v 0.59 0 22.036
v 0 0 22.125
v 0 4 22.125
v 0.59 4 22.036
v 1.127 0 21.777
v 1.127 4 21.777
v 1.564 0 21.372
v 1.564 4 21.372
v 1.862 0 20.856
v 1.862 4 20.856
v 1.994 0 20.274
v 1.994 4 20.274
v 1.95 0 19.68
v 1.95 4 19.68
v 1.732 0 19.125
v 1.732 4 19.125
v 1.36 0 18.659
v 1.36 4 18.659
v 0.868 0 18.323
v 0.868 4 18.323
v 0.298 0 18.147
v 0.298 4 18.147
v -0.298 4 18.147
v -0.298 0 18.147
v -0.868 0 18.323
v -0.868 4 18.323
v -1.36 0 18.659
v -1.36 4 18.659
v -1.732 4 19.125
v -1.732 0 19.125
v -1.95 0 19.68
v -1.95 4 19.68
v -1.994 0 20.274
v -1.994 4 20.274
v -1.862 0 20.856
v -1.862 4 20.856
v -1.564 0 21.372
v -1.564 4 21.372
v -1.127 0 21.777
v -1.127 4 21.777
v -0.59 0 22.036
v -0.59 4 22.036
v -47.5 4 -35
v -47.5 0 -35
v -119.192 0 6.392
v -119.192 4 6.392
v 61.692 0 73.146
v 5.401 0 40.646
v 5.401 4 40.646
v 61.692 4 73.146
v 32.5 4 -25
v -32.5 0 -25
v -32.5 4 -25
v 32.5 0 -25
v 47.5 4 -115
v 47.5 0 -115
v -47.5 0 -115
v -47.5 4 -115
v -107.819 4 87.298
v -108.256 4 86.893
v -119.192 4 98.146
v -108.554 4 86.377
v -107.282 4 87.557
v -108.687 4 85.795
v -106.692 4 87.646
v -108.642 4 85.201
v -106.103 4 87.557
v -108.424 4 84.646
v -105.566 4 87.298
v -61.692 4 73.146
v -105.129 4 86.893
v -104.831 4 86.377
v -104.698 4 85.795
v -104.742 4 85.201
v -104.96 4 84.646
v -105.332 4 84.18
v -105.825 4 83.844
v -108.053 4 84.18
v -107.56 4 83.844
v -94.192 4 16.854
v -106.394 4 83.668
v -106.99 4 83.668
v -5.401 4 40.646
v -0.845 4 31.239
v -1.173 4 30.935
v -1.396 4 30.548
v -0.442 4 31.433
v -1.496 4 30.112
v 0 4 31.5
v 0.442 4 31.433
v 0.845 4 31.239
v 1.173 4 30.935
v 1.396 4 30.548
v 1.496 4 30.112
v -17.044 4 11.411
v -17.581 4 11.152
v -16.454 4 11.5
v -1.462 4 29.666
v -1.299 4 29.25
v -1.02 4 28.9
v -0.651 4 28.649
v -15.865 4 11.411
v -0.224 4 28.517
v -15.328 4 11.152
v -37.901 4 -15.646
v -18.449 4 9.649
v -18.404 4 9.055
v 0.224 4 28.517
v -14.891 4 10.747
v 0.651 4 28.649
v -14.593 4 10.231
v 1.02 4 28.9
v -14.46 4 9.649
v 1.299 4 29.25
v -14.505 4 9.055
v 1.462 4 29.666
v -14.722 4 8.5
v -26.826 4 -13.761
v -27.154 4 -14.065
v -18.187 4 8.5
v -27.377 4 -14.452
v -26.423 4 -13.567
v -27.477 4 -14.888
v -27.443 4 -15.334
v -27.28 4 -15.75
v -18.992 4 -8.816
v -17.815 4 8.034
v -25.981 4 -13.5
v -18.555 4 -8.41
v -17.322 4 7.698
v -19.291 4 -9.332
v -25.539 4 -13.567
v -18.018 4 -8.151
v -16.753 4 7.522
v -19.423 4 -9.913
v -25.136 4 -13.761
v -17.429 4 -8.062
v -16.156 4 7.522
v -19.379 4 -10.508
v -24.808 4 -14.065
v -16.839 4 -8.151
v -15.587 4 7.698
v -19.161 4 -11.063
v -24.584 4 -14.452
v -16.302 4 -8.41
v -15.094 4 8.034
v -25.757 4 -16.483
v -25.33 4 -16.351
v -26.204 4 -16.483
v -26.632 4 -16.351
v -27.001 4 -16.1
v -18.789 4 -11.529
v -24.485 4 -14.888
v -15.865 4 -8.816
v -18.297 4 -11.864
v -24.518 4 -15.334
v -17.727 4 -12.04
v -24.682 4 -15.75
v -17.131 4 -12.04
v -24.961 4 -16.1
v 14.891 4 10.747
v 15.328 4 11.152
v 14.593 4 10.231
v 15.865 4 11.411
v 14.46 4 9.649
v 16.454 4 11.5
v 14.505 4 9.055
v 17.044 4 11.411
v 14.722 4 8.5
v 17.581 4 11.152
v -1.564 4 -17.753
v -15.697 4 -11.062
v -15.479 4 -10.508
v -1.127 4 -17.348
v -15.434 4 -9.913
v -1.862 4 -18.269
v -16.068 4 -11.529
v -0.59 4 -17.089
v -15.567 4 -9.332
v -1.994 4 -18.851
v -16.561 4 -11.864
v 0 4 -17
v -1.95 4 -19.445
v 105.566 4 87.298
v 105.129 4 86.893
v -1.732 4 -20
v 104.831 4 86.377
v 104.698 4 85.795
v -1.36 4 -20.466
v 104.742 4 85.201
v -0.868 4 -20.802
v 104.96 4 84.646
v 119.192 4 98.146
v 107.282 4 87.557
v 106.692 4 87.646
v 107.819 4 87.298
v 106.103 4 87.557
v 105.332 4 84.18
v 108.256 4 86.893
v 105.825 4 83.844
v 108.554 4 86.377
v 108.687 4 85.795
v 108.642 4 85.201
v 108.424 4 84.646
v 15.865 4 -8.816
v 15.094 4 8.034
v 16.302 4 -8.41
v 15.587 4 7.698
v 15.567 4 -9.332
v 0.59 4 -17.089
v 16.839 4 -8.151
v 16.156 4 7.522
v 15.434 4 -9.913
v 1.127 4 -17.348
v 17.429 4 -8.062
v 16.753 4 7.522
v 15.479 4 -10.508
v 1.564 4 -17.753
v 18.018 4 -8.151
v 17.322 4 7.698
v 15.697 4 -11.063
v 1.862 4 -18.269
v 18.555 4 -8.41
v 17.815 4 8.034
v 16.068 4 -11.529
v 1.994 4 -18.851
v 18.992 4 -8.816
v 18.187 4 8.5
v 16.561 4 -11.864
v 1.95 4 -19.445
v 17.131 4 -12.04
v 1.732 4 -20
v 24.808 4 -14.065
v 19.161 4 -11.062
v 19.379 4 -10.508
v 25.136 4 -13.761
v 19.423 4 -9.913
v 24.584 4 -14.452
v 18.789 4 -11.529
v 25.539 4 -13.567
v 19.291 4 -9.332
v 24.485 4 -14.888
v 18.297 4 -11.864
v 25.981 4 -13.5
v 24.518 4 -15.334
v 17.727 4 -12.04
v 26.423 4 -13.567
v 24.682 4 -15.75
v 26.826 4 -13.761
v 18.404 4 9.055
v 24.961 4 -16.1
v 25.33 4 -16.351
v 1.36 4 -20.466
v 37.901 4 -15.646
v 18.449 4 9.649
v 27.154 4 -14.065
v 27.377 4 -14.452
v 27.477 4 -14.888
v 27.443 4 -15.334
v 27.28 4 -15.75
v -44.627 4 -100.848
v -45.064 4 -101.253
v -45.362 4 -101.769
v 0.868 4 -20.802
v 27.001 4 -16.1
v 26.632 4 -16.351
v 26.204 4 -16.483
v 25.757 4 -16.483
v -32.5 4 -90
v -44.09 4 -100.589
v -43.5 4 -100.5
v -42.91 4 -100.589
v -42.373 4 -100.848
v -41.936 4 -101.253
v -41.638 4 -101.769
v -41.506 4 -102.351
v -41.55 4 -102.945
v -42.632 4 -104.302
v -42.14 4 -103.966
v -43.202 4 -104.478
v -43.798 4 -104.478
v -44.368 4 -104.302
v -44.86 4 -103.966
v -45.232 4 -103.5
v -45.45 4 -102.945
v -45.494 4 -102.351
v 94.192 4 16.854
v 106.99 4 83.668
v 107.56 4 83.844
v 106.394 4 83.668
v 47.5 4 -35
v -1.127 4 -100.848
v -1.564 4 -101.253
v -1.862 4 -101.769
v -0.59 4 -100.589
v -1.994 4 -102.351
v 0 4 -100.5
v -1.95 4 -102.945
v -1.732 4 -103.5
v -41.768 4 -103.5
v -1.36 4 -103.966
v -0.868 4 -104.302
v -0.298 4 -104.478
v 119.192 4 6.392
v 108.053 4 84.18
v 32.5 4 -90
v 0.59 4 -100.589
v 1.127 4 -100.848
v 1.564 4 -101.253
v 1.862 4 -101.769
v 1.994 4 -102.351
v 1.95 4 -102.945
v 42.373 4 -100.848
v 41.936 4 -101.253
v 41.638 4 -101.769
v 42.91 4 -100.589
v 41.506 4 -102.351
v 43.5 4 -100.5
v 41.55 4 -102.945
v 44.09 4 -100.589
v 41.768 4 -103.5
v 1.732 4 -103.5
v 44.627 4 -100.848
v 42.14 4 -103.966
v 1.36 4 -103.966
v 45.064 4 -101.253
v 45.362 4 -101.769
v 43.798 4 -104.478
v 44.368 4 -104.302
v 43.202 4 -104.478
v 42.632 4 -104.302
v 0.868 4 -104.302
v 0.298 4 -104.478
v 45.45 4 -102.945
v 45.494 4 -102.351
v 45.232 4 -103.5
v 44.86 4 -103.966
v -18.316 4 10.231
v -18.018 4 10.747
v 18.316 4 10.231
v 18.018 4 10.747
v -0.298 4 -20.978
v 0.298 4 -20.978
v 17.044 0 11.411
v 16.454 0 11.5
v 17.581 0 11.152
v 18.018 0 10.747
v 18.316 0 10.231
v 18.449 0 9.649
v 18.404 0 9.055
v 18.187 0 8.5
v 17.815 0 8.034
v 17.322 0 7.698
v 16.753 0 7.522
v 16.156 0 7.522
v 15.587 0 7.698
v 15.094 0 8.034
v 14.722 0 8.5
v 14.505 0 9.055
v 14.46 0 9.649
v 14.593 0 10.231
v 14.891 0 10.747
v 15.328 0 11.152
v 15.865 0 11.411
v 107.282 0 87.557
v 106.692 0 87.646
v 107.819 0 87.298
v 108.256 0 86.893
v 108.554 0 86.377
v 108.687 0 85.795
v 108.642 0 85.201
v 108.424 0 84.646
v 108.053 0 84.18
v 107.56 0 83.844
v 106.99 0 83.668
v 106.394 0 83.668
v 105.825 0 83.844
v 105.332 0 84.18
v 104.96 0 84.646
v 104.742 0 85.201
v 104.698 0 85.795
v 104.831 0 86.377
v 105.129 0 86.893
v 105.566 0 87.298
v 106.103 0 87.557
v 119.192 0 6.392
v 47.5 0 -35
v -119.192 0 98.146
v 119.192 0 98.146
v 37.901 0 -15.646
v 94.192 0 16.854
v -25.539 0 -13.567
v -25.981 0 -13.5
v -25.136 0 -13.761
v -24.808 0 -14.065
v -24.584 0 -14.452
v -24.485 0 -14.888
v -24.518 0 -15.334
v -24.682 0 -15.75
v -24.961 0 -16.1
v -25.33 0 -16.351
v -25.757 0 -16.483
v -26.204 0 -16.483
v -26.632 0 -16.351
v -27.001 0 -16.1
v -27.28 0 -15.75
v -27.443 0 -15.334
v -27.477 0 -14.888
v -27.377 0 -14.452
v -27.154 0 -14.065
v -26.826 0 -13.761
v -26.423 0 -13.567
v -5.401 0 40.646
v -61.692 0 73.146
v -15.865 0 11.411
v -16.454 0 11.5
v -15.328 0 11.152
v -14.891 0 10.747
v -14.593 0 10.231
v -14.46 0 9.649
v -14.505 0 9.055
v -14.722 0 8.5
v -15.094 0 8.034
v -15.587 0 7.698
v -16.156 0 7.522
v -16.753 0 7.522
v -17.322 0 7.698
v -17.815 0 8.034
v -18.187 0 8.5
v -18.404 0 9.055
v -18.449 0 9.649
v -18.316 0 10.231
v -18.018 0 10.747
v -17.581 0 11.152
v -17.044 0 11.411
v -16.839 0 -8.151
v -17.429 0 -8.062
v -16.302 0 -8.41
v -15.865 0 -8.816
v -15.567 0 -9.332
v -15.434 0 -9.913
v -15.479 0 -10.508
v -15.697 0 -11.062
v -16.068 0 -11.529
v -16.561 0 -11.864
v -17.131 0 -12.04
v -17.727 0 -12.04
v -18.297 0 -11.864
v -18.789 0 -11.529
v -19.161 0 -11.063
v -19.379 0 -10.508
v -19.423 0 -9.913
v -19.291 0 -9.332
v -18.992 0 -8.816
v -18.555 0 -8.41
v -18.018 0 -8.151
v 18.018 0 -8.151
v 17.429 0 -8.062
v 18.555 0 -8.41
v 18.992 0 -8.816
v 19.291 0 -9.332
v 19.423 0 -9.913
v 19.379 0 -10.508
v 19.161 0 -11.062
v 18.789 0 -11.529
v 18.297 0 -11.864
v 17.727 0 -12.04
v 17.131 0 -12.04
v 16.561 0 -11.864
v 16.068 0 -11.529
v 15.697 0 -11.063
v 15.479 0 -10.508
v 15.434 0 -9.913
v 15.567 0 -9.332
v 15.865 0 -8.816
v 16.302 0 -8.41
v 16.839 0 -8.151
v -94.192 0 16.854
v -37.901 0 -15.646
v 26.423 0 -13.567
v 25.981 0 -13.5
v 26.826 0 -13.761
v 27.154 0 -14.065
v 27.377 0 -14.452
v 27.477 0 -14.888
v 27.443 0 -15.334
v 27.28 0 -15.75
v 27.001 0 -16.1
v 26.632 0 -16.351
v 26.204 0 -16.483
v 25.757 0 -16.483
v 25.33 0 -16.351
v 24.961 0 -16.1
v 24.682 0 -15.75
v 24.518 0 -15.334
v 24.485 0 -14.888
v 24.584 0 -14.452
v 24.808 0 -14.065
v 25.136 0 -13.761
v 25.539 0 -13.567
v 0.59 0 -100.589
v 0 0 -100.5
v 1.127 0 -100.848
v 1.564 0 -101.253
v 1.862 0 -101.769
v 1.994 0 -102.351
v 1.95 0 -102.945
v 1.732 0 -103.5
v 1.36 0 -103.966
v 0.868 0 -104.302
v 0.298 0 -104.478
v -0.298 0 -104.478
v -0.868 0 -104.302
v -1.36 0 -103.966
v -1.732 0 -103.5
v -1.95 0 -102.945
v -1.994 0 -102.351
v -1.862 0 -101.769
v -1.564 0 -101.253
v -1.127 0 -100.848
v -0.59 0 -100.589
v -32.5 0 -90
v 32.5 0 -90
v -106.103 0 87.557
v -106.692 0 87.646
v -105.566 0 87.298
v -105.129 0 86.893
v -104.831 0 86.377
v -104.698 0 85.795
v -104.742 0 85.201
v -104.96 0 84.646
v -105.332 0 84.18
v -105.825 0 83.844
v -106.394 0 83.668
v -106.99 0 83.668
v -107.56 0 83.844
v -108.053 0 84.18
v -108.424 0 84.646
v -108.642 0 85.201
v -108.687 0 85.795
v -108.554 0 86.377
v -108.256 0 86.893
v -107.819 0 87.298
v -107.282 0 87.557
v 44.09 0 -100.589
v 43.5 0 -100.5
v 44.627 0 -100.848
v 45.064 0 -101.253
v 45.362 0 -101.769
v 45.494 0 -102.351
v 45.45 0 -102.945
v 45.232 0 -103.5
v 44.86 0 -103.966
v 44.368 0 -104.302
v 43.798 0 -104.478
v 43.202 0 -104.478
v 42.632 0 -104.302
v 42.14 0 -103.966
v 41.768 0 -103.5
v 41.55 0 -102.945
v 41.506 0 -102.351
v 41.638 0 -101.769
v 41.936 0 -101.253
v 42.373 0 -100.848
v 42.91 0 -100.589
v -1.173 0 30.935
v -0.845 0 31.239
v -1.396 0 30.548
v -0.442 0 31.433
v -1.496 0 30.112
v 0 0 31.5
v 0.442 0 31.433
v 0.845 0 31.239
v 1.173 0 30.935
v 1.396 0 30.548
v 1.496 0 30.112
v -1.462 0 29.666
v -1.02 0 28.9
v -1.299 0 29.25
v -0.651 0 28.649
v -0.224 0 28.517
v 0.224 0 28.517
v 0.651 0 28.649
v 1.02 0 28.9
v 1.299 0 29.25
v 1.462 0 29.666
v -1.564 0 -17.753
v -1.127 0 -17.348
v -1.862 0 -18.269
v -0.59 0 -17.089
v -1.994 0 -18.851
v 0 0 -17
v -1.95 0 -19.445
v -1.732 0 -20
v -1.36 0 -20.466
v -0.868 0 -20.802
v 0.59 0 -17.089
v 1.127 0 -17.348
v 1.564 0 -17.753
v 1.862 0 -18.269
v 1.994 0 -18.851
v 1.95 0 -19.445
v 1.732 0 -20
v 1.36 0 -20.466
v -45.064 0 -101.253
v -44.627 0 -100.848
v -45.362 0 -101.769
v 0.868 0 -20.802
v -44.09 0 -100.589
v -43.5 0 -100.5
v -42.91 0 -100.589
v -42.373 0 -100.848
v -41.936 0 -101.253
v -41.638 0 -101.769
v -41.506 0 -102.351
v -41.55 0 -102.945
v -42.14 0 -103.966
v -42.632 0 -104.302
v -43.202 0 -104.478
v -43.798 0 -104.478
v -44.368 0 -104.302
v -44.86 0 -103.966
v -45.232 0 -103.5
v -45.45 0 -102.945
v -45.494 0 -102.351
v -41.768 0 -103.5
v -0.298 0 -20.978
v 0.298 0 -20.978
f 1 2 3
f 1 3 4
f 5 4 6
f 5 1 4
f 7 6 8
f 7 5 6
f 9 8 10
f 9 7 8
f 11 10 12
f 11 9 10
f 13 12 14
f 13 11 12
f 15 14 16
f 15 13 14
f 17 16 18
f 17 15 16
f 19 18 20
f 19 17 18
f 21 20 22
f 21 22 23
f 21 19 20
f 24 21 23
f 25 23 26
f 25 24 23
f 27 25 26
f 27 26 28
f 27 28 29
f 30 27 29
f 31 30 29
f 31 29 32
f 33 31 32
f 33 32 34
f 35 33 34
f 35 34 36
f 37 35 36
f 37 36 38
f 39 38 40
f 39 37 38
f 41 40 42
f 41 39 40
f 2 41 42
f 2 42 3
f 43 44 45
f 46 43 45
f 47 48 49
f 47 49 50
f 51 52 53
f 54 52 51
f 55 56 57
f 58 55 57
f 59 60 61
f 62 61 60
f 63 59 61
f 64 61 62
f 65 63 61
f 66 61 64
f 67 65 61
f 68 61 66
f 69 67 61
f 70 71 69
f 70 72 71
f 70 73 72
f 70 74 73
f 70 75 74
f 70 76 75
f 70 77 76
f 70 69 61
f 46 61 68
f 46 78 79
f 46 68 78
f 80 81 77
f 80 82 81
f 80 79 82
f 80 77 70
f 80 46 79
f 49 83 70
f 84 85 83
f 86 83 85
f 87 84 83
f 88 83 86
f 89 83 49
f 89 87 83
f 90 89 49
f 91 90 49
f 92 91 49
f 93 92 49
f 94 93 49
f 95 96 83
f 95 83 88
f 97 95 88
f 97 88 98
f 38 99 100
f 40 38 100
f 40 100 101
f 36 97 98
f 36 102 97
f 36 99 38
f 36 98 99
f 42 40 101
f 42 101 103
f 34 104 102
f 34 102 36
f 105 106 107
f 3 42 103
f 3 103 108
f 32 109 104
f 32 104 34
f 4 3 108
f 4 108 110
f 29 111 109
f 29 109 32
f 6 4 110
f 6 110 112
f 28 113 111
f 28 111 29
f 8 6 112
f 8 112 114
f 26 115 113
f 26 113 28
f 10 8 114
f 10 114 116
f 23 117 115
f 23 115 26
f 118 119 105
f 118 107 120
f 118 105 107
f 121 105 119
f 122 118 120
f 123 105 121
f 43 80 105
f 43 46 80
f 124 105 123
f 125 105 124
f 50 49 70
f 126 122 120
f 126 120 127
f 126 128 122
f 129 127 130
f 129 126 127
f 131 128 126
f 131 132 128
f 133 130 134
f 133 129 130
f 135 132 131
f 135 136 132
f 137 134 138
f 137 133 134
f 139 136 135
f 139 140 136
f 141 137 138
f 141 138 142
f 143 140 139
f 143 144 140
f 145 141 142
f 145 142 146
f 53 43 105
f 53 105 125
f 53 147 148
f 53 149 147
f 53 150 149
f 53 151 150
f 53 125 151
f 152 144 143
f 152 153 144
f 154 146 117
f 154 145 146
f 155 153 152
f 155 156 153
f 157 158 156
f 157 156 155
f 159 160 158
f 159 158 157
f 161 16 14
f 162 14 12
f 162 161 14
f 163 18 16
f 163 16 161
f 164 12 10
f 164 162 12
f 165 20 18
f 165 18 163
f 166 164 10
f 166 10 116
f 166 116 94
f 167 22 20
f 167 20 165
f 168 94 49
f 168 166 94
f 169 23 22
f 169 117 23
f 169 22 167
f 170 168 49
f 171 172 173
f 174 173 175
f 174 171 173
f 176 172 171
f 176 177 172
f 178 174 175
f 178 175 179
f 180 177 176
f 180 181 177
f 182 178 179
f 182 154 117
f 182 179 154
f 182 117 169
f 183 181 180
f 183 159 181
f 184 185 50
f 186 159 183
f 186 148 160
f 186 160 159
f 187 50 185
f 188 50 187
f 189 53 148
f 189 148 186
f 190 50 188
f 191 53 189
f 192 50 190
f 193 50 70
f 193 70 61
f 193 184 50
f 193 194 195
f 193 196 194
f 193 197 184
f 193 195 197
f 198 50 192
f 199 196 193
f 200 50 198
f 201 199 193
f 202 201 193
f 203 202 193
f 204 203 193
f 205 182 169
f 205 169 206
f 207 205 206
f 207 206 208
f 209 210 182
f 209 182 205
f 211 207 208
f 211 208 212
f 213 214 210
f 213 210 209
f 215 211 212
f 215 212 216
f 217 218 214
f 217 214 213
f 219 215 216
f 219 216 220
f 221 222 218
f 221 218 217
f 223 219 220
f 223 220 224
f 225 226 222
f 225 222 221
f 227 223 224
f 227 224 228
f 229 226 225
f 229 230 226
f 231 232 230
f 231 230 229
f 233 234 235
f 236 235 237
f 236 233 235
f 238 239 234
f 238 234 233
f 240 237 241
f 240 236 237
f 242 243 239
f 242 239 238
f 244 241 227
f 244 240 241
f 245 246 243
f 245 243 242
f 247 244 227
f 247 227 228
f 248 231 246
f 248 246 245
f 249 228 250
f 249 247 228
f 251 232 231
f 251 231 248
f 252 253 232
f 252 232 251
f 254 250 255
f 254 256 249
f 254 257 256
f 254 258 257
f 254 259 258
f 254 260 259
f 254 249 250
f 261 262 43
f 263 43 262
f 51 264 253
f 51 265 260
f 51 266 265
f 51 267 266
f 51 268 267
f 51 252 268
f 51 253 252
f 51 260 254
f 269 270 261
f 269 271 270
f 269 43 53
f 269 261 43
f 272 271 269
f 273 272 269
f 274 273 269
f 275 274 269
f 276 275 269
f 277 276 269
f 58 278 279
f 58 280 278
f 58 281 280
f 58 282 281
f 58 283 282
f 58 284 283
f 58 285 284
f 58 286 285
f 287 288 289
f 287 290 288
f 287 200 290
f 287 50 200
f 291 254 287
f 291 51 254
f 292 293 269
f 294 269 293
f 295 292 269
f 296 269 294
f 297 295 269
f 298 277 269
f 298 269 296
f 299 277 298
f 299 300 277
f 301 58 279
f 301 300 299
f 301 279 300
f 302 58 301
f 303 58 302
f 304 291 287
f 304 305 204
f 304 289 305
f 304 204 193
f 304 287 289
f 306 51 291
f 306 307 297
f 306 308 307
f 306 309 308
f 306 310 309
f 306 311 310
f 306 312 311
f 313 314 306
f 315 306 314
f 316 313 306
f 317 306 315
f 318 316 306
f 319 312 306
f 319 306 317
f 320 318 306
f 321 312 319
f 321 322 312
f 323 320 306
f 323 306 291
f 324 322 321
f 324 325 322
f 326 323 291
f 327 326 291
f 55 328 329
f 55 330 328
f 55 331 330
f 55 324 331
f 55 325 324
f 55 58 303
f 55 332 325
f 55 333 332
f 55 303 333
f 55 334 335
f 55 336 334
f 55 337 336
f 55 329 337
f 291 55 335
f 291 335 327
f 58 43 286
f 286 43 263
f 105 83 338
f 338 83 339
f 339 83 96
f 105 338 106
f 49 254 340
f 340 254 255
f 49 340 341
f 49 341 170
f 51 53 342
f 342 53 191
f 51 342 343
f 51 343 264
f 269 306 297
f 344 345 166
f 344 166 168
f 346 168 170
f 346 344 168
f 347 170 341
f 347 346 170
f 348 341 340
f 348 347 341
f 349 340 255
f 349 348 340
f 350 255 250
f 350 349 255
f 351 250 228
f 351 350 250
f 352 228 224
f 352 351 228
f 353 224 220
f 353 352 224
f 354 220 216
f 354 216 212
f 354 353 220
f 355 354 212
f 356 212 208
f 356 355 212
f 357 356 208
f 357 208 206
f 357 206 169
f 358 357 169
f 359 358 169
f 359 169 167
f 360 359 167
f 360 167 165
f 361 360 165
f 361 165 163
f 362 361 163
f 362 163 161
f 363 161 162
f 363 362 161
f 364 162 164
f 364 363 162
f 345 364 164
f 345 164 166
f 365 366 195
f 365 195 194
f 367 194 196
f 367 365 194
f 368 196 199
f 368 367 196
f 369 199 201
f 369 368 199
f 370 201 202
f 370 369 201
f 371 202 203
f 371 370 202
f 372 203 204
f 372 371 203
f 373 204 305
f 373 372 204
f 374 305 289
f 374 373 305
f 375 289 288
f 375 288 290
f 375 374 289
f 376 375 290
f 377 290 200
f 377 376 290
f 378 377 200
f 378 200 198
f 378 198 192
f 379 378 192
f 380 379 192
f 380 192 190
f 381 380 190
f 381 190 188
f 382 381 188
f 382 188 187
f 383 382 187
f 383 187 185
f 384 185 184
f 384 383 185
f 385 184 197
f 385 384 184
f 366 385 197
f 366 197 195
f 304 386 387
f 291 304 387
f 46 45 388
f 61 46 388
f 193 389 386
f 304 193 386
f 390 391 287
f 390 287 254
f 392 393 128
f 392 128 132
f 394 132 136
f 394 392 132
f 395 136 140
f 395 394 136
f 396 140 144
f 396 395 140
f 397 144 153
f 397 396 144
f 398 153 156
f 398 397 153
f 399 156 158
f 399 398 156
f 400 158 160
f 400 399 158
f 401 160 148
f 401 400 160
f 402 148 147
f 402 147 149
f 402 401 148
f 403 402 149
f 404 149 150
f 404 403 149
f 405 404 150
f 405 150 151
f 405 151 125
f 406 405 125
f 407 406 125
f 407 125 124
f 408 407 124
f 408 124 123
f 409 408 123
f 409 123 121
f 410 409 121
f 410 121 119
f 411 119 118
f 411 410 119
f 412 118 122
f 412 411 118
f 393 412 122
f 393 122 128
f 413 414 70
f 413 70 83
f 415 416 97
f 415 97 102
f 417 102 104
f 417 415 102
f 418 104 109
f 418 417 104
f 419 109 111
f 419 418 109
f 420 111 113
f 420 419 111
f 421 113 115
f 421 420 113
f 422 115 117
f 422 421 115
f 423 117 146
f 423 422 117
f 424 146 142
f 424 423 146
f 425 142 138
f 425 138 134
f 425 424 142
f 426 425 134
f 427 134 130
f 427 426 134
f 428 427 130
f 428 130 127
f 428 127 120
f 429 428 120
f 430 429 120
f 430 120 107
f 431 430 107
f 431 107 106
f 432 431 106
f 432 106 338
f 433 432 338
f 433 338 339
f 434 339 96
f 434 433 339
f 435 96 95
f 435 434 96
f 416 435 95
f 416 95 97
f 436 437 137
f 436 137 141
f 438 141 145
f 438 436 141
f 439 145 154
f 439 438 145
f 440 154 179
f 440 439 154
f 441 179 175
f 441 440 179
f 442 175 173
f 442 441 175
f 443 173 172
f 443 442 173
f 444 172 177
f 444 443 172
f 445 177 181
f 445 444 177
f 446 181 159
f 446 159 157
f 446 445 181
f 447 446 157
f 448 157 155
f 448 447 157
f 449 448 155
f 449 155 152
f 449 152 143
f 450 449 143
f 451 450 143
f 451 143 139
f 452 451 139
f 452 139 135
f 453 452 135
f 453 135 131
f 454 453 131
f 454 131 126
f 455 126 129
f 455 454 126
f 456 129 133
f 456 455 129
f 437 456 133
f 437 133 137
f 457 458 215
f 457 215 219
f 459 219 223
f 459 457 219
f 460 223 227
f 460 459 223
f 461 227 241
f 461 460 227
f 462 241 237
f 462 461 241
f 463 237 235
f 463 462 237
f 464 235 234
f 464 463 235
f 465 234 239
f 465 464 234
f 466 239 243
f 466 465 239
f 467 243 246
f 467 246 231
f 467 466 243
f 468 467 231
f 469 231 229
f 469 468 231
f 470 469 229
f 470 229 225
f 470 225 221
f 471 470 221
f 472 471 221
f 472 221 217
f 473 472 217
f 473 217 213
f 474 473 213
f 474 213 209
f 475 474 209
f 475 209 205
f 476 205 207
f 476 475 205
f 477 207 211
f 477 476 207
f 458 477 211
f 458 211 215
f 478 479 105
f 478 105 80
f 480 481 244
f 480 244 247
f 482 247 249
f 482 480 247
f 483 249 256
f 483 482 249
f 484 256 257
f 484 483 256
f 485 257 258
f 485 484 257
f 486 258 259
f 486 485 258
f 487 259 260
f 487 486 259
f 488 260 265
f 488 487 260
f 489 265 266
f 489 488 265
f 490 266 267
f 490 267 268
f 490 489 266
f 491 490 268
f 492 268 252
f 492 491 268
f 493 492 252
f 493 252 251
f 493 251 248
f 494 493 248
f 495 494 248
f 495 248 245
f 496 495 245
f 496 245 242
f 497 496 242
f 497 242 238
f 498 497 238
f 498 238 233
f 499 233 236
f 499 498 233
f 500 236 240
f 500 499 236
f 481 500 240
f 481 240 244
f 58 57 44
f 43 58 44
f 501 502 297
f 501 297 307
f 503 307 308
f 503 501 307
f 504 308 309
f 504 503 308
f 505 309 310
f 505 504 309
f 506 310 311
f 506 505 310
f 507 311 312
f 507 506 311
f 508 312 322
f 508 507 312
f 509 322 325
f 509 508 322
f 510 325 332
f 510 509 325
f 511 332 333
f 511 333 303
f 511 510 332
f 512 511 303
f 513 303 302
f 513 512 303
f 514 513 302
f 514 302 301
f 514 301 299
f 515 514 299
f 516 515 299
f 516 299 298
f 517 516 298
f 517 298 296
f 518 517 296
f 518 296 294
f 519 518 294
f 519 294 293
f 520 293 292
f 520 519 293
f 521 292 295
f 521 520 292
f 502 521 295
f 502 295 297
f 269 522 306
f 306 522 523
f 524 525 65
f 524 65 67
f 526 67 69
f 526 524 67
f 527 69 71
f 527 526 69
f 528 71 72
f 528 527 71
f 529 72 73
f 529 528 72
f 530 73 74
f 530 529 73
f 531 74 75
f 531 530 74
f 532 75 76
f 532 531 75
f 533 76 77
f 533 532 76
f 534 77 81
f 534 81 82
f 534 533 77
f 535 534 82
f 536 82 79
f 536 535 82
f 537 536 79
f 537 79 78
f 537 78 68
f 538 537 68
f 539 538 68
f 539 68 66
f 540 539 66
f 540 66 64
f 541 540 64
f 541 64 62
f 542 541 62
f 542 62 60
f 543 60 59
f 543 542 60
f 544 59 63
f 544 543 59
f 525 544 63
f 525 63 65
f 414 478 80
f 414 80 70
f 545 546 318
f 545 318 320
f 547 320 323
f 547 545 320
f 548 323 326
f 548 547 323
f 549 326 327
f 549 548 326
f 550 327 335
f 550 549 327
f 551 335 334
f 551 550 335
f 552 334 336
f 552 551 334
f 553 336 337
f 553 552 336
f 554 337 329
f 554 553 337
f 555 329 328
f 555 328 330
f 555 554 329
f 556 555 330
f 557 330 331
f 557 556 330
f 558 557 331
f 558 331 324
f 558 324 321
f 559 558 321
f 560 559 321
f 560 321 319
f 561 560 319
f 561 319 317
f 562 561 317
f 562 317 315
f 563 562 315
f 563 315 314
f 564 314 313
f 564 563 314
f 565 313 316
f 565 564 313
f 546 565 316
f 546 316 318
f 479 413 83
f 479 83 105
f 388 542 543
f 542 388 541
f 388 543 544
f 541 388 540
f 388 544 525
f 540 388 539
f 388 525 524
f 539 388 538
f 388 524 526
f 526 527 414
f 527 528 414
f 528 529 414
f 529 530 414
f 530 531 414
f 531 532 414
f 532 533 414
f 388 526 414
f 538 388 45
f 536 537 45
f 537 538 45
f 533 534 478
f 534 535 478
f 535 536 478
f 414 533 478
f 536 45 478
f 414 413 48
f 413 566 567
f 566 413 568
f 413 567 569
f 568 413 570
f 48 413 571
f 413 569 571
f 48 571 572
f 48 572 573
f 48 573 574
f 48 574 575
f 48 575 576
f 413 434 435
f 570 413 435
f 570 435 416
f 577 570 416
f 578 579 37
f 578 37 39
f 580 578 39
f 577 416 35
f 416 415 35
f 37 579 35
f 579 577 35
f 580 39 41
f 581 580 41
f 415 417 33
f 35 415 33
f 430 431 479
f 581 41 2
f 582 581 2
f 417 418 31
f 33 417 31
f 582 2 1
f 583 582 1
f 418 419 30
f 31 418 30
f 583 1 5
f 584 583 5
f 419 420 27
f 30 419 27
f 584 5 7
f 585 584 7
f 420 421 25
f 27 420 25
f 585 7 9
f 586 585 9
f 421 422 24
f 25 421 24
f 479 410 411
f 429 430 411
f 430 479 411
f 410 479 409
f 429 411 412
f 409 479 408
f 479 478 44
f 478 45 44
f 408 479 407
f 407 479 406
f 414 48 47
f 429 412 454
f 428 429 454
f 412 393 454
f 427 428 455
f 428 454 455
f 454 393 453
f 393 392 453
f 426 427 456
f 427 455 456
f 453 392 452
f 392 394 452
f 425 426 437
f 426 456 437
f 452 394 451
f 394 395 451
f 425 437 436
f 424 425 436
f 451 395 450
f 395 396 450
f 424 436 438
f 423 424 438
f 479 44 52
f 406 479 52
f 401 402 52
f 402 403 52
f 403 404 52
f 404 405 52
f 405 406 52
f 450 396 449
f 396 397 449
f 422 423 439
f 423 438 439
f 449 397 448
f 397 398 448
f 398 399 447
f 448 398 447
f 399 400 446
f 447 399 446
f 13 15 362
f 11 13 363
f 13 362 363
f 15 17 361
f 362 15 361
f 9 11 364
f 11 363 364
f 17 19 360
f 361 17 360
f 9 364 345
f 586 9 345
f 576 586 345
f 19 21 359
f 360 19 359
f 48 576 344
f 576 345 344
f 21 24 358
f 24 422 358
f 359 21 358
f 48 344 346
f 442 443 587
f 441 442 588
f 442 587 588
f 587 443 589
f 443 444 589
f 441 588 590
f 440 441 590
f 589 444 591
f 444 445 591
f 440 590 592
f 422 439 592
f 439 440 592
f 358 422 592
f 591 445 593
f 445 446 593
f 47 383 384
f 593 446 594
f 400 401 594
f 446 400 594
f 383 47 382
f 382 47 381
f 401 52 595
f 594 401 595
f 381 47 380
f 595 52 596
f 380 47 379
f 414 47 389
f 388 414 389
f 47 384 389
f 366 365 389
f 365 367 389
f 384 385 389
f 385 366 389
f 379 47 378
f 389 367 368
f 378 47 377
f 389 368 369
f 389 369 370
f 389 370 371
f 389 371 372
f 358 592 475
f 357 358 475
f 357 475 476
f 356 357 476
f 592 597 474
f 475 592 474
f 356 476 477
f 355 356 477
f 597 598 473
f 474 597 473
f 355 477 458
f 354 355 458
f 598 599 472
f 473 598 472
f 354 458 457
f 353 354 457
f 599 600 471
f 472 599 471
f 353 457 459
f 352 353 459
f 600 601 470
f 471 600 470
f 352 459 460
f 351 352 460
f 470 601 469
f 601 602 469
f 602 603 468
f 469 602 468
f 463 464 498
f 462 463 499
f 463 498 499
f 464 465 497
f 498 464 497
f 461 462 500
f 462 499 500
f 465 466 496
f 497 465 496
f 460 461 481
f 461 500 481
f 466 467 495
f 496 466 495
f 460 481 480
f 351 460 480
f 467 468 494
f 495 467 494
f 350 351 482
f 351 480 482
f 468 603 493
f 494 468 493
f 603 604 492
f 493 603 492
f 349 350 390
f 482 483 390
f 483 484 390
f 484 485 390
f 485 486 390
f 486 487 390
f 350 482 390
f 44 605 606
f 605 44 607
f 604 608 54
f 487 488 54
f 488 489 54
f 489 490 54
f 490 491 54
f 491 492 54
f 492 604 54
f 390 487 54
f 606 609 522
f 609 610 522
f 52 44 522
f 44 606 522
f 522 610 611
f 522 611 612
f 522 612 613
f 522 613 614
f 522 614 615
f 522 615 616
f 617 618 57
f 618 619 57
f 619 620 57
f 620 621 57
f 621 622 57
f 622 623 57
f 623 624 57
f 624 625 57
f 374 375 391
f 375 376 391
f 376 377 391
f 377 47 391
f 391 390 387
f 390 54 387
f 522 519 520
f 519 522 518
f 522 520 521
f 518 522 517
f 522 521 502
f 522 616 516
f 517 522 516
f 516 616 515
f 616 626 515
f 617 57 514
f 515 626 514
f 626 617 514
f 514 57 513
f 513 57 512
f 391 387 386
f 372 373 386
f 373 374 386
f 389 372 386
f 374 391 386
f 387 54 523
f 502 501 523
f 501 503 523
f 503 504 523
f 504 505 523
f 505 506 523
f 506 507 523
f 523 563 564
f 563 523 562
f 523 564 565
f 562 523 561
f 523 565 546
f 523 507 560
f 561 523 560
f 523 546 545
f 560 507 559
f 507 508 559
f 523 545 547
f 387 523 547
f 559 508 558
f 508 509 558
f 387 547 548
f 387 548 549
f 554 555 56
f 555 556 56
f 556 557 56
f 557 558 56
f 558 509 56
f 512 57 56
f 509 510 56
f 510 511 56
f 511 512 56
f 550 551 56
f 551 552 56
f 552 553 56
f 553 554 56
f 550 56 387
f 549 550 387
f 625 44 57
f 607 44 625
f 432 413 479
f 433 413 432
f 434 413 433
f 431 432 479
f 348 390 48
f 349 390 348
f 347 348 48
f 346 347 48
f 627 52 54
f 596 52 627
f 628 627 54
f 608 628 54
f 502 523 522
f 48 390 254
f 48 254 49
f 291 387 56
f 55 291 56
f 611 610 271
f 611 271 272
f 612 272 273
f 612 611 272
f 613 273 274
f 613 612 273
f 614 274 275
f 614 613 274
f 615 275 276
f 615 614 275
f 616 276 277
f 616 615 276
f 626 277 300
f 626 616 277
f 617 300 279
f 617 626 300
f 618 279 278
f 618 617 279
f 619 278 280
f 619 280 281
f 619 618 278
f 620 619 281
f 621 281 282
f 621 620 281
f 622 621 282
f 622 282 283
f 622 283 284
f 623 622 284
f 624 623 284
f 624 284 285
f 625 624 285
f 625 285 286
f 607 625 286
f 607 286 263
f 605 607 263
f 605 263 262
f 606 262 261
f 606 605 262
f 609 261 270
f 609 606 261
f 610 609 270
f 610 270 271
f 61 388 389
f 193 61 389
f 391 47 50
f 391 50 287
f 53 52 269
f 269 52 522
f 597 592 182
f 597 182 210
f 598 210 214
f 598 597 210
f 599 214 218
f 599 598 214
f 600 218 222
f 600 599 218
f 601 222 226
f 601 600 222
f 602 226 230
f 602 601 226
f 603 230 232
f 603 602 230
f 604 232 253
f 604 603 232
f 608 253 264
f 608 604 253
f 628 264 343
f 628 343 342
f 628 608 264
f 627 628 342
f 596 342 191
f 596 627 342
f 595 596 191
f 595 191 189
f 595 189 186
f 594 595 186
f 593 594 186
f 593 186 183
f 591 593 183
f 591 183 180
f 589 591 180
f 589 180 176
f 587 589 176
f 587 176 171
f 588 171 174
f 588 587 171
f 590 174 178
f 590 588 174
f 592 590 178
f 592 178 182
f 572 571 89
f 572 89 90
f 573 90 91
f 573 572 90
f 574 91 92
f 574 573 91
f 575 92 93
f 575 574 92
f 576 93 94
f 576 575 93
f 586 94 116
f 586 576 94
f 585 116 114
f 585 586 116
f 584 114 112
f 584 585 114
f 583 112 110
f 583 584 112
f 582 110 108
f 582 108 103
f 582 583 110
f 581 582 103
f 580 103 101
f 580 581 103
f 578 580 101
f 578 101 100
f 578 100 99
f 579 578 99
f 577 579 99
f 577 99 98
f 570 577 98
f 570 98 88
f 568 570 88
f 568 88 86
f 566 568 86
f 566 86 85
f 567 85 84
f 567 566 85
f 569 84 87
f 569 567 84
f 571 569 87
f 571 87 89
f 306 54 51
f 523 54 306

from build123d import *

# Parameters (mm, degrees)
SKETCH_1_R      = 2
SKETCH_1_R_2    = 1.5
SKETCH_1_W      = 65
SKETCH_1_H      = 65
EXTRUDE_1_DEPTH = 4


with BuildPart() as part:
    # 草图1 → 凸台-拉伸1 (new body)
    with BuildSketch(Plane(origin=(0, 0, 0), x_dir=(1, 0, 0), z_dir=(0, 1, 0))):
        Polygon((119.192286341, -98.145825623), (119.192286341, -6.391560818), (47.5, 35), (47.5, 115), (-47.5, 115), (-47.5, 35), (-119.192286341, -6.391560818), (-119.192286341, -98.145825623), align=None)
        with Locations(Location((0, 19, 0), (0, 0, 270))):
            Circle(SKETCH_1_R, mode=Mode.SUBTRACT)
        with Locations(Location((25.980762114, 15, 0), (0, 0, 270))):
            Circle(SKETCH_1_R_2, mode=Mode.SUBTRACT)
        with Locations(Location((16.454482672, -9.5, 0), (0, 0, 270))):
            Circle(SKETCH_1_R, mode=Mode.SUBTRACT)
        with Locations(Location((0, -30, 0), (0, 0, 270))):
            Circle(SKETCH_1_R_2, mode=Mode.SUBTRACT)
        with Locations(Location((-16.454482672, -9.5, 0), (0, 0, 270))):
            Circle(SKETCH_1_R, mode=Mode.SUBTRACT)
        with Locations(Location((-25.980762114, 15, 0), (0, 0, 270))):
            Circle(SKETCH_1_R_2, mode=Mode.SUBTRACT)
        with Locations(Location((0, 102.5, 0), (0, 0, 270))):
            Circle(SKETCH_1_R, mode=Mode.SUBTRACT)
        with Locations(Location((-106.692286341, -85.645825623, 0), (0, 0, 270))):
            Circle(SKETCH_1_R, mode=Mode.SUBTRACT)
        with Locations(Location((106.692286341, -85.645825623, 0), (0, 0, 270))):
            Circle(SKETCH_1_R, mode=Mode.SUBTRACT)
        with Locations(Location((-43.5, 102.5, 0), (0, 0, 270))):
            Circle(SKETCH_1_R, mode=Mode.SUBTRACT)
        with Locations(Location((43.5, 102.5, 0), (0, 0, 270))):
            Circle(SKETCH_1_R, mode=Mode.SUBTRACT)
        with Locations(Location((-17.428761251, 10.0625, 0), (0, 0, 270))):
            Circle(SKETCH_1_R, mode=Mode.SUBTRACT)
        with Locations(Location((17.428761251, 10.0625, 0), (0, 0, 270))):
            Circle(SKETCH_1_R, mode=Mode.SUBTRACT)
        with Locations(Location((0, -20.125, 0), (0, 0, 270))):
            Circle(SKETCH_1_R, mode=Mode.SUBTRACT)
        with Locations((0, 57.5)):
            Rectangle(SKETCH_1_W, SKETCH_1_H, mode=Mode.SUBTRACT)
        Polygon((37.900635095, 15.645825623), (5.400635095, -40.645825623), (61.692286341, -73.145825623), (94.192286341, -16.854174377), align=None, mode=Mode.SUBTRACT)
        Polygon((-5.400635095, -40.645825623), (-37.900635095, 15.645825623), (-94.192286341, -16.854174377), (-61.692286341, -73.145825623), align=None, mode=Mode.SUBTRACT)
    extrude(amount=EXTRUDE_1_DEPTH)


solid = part.part
